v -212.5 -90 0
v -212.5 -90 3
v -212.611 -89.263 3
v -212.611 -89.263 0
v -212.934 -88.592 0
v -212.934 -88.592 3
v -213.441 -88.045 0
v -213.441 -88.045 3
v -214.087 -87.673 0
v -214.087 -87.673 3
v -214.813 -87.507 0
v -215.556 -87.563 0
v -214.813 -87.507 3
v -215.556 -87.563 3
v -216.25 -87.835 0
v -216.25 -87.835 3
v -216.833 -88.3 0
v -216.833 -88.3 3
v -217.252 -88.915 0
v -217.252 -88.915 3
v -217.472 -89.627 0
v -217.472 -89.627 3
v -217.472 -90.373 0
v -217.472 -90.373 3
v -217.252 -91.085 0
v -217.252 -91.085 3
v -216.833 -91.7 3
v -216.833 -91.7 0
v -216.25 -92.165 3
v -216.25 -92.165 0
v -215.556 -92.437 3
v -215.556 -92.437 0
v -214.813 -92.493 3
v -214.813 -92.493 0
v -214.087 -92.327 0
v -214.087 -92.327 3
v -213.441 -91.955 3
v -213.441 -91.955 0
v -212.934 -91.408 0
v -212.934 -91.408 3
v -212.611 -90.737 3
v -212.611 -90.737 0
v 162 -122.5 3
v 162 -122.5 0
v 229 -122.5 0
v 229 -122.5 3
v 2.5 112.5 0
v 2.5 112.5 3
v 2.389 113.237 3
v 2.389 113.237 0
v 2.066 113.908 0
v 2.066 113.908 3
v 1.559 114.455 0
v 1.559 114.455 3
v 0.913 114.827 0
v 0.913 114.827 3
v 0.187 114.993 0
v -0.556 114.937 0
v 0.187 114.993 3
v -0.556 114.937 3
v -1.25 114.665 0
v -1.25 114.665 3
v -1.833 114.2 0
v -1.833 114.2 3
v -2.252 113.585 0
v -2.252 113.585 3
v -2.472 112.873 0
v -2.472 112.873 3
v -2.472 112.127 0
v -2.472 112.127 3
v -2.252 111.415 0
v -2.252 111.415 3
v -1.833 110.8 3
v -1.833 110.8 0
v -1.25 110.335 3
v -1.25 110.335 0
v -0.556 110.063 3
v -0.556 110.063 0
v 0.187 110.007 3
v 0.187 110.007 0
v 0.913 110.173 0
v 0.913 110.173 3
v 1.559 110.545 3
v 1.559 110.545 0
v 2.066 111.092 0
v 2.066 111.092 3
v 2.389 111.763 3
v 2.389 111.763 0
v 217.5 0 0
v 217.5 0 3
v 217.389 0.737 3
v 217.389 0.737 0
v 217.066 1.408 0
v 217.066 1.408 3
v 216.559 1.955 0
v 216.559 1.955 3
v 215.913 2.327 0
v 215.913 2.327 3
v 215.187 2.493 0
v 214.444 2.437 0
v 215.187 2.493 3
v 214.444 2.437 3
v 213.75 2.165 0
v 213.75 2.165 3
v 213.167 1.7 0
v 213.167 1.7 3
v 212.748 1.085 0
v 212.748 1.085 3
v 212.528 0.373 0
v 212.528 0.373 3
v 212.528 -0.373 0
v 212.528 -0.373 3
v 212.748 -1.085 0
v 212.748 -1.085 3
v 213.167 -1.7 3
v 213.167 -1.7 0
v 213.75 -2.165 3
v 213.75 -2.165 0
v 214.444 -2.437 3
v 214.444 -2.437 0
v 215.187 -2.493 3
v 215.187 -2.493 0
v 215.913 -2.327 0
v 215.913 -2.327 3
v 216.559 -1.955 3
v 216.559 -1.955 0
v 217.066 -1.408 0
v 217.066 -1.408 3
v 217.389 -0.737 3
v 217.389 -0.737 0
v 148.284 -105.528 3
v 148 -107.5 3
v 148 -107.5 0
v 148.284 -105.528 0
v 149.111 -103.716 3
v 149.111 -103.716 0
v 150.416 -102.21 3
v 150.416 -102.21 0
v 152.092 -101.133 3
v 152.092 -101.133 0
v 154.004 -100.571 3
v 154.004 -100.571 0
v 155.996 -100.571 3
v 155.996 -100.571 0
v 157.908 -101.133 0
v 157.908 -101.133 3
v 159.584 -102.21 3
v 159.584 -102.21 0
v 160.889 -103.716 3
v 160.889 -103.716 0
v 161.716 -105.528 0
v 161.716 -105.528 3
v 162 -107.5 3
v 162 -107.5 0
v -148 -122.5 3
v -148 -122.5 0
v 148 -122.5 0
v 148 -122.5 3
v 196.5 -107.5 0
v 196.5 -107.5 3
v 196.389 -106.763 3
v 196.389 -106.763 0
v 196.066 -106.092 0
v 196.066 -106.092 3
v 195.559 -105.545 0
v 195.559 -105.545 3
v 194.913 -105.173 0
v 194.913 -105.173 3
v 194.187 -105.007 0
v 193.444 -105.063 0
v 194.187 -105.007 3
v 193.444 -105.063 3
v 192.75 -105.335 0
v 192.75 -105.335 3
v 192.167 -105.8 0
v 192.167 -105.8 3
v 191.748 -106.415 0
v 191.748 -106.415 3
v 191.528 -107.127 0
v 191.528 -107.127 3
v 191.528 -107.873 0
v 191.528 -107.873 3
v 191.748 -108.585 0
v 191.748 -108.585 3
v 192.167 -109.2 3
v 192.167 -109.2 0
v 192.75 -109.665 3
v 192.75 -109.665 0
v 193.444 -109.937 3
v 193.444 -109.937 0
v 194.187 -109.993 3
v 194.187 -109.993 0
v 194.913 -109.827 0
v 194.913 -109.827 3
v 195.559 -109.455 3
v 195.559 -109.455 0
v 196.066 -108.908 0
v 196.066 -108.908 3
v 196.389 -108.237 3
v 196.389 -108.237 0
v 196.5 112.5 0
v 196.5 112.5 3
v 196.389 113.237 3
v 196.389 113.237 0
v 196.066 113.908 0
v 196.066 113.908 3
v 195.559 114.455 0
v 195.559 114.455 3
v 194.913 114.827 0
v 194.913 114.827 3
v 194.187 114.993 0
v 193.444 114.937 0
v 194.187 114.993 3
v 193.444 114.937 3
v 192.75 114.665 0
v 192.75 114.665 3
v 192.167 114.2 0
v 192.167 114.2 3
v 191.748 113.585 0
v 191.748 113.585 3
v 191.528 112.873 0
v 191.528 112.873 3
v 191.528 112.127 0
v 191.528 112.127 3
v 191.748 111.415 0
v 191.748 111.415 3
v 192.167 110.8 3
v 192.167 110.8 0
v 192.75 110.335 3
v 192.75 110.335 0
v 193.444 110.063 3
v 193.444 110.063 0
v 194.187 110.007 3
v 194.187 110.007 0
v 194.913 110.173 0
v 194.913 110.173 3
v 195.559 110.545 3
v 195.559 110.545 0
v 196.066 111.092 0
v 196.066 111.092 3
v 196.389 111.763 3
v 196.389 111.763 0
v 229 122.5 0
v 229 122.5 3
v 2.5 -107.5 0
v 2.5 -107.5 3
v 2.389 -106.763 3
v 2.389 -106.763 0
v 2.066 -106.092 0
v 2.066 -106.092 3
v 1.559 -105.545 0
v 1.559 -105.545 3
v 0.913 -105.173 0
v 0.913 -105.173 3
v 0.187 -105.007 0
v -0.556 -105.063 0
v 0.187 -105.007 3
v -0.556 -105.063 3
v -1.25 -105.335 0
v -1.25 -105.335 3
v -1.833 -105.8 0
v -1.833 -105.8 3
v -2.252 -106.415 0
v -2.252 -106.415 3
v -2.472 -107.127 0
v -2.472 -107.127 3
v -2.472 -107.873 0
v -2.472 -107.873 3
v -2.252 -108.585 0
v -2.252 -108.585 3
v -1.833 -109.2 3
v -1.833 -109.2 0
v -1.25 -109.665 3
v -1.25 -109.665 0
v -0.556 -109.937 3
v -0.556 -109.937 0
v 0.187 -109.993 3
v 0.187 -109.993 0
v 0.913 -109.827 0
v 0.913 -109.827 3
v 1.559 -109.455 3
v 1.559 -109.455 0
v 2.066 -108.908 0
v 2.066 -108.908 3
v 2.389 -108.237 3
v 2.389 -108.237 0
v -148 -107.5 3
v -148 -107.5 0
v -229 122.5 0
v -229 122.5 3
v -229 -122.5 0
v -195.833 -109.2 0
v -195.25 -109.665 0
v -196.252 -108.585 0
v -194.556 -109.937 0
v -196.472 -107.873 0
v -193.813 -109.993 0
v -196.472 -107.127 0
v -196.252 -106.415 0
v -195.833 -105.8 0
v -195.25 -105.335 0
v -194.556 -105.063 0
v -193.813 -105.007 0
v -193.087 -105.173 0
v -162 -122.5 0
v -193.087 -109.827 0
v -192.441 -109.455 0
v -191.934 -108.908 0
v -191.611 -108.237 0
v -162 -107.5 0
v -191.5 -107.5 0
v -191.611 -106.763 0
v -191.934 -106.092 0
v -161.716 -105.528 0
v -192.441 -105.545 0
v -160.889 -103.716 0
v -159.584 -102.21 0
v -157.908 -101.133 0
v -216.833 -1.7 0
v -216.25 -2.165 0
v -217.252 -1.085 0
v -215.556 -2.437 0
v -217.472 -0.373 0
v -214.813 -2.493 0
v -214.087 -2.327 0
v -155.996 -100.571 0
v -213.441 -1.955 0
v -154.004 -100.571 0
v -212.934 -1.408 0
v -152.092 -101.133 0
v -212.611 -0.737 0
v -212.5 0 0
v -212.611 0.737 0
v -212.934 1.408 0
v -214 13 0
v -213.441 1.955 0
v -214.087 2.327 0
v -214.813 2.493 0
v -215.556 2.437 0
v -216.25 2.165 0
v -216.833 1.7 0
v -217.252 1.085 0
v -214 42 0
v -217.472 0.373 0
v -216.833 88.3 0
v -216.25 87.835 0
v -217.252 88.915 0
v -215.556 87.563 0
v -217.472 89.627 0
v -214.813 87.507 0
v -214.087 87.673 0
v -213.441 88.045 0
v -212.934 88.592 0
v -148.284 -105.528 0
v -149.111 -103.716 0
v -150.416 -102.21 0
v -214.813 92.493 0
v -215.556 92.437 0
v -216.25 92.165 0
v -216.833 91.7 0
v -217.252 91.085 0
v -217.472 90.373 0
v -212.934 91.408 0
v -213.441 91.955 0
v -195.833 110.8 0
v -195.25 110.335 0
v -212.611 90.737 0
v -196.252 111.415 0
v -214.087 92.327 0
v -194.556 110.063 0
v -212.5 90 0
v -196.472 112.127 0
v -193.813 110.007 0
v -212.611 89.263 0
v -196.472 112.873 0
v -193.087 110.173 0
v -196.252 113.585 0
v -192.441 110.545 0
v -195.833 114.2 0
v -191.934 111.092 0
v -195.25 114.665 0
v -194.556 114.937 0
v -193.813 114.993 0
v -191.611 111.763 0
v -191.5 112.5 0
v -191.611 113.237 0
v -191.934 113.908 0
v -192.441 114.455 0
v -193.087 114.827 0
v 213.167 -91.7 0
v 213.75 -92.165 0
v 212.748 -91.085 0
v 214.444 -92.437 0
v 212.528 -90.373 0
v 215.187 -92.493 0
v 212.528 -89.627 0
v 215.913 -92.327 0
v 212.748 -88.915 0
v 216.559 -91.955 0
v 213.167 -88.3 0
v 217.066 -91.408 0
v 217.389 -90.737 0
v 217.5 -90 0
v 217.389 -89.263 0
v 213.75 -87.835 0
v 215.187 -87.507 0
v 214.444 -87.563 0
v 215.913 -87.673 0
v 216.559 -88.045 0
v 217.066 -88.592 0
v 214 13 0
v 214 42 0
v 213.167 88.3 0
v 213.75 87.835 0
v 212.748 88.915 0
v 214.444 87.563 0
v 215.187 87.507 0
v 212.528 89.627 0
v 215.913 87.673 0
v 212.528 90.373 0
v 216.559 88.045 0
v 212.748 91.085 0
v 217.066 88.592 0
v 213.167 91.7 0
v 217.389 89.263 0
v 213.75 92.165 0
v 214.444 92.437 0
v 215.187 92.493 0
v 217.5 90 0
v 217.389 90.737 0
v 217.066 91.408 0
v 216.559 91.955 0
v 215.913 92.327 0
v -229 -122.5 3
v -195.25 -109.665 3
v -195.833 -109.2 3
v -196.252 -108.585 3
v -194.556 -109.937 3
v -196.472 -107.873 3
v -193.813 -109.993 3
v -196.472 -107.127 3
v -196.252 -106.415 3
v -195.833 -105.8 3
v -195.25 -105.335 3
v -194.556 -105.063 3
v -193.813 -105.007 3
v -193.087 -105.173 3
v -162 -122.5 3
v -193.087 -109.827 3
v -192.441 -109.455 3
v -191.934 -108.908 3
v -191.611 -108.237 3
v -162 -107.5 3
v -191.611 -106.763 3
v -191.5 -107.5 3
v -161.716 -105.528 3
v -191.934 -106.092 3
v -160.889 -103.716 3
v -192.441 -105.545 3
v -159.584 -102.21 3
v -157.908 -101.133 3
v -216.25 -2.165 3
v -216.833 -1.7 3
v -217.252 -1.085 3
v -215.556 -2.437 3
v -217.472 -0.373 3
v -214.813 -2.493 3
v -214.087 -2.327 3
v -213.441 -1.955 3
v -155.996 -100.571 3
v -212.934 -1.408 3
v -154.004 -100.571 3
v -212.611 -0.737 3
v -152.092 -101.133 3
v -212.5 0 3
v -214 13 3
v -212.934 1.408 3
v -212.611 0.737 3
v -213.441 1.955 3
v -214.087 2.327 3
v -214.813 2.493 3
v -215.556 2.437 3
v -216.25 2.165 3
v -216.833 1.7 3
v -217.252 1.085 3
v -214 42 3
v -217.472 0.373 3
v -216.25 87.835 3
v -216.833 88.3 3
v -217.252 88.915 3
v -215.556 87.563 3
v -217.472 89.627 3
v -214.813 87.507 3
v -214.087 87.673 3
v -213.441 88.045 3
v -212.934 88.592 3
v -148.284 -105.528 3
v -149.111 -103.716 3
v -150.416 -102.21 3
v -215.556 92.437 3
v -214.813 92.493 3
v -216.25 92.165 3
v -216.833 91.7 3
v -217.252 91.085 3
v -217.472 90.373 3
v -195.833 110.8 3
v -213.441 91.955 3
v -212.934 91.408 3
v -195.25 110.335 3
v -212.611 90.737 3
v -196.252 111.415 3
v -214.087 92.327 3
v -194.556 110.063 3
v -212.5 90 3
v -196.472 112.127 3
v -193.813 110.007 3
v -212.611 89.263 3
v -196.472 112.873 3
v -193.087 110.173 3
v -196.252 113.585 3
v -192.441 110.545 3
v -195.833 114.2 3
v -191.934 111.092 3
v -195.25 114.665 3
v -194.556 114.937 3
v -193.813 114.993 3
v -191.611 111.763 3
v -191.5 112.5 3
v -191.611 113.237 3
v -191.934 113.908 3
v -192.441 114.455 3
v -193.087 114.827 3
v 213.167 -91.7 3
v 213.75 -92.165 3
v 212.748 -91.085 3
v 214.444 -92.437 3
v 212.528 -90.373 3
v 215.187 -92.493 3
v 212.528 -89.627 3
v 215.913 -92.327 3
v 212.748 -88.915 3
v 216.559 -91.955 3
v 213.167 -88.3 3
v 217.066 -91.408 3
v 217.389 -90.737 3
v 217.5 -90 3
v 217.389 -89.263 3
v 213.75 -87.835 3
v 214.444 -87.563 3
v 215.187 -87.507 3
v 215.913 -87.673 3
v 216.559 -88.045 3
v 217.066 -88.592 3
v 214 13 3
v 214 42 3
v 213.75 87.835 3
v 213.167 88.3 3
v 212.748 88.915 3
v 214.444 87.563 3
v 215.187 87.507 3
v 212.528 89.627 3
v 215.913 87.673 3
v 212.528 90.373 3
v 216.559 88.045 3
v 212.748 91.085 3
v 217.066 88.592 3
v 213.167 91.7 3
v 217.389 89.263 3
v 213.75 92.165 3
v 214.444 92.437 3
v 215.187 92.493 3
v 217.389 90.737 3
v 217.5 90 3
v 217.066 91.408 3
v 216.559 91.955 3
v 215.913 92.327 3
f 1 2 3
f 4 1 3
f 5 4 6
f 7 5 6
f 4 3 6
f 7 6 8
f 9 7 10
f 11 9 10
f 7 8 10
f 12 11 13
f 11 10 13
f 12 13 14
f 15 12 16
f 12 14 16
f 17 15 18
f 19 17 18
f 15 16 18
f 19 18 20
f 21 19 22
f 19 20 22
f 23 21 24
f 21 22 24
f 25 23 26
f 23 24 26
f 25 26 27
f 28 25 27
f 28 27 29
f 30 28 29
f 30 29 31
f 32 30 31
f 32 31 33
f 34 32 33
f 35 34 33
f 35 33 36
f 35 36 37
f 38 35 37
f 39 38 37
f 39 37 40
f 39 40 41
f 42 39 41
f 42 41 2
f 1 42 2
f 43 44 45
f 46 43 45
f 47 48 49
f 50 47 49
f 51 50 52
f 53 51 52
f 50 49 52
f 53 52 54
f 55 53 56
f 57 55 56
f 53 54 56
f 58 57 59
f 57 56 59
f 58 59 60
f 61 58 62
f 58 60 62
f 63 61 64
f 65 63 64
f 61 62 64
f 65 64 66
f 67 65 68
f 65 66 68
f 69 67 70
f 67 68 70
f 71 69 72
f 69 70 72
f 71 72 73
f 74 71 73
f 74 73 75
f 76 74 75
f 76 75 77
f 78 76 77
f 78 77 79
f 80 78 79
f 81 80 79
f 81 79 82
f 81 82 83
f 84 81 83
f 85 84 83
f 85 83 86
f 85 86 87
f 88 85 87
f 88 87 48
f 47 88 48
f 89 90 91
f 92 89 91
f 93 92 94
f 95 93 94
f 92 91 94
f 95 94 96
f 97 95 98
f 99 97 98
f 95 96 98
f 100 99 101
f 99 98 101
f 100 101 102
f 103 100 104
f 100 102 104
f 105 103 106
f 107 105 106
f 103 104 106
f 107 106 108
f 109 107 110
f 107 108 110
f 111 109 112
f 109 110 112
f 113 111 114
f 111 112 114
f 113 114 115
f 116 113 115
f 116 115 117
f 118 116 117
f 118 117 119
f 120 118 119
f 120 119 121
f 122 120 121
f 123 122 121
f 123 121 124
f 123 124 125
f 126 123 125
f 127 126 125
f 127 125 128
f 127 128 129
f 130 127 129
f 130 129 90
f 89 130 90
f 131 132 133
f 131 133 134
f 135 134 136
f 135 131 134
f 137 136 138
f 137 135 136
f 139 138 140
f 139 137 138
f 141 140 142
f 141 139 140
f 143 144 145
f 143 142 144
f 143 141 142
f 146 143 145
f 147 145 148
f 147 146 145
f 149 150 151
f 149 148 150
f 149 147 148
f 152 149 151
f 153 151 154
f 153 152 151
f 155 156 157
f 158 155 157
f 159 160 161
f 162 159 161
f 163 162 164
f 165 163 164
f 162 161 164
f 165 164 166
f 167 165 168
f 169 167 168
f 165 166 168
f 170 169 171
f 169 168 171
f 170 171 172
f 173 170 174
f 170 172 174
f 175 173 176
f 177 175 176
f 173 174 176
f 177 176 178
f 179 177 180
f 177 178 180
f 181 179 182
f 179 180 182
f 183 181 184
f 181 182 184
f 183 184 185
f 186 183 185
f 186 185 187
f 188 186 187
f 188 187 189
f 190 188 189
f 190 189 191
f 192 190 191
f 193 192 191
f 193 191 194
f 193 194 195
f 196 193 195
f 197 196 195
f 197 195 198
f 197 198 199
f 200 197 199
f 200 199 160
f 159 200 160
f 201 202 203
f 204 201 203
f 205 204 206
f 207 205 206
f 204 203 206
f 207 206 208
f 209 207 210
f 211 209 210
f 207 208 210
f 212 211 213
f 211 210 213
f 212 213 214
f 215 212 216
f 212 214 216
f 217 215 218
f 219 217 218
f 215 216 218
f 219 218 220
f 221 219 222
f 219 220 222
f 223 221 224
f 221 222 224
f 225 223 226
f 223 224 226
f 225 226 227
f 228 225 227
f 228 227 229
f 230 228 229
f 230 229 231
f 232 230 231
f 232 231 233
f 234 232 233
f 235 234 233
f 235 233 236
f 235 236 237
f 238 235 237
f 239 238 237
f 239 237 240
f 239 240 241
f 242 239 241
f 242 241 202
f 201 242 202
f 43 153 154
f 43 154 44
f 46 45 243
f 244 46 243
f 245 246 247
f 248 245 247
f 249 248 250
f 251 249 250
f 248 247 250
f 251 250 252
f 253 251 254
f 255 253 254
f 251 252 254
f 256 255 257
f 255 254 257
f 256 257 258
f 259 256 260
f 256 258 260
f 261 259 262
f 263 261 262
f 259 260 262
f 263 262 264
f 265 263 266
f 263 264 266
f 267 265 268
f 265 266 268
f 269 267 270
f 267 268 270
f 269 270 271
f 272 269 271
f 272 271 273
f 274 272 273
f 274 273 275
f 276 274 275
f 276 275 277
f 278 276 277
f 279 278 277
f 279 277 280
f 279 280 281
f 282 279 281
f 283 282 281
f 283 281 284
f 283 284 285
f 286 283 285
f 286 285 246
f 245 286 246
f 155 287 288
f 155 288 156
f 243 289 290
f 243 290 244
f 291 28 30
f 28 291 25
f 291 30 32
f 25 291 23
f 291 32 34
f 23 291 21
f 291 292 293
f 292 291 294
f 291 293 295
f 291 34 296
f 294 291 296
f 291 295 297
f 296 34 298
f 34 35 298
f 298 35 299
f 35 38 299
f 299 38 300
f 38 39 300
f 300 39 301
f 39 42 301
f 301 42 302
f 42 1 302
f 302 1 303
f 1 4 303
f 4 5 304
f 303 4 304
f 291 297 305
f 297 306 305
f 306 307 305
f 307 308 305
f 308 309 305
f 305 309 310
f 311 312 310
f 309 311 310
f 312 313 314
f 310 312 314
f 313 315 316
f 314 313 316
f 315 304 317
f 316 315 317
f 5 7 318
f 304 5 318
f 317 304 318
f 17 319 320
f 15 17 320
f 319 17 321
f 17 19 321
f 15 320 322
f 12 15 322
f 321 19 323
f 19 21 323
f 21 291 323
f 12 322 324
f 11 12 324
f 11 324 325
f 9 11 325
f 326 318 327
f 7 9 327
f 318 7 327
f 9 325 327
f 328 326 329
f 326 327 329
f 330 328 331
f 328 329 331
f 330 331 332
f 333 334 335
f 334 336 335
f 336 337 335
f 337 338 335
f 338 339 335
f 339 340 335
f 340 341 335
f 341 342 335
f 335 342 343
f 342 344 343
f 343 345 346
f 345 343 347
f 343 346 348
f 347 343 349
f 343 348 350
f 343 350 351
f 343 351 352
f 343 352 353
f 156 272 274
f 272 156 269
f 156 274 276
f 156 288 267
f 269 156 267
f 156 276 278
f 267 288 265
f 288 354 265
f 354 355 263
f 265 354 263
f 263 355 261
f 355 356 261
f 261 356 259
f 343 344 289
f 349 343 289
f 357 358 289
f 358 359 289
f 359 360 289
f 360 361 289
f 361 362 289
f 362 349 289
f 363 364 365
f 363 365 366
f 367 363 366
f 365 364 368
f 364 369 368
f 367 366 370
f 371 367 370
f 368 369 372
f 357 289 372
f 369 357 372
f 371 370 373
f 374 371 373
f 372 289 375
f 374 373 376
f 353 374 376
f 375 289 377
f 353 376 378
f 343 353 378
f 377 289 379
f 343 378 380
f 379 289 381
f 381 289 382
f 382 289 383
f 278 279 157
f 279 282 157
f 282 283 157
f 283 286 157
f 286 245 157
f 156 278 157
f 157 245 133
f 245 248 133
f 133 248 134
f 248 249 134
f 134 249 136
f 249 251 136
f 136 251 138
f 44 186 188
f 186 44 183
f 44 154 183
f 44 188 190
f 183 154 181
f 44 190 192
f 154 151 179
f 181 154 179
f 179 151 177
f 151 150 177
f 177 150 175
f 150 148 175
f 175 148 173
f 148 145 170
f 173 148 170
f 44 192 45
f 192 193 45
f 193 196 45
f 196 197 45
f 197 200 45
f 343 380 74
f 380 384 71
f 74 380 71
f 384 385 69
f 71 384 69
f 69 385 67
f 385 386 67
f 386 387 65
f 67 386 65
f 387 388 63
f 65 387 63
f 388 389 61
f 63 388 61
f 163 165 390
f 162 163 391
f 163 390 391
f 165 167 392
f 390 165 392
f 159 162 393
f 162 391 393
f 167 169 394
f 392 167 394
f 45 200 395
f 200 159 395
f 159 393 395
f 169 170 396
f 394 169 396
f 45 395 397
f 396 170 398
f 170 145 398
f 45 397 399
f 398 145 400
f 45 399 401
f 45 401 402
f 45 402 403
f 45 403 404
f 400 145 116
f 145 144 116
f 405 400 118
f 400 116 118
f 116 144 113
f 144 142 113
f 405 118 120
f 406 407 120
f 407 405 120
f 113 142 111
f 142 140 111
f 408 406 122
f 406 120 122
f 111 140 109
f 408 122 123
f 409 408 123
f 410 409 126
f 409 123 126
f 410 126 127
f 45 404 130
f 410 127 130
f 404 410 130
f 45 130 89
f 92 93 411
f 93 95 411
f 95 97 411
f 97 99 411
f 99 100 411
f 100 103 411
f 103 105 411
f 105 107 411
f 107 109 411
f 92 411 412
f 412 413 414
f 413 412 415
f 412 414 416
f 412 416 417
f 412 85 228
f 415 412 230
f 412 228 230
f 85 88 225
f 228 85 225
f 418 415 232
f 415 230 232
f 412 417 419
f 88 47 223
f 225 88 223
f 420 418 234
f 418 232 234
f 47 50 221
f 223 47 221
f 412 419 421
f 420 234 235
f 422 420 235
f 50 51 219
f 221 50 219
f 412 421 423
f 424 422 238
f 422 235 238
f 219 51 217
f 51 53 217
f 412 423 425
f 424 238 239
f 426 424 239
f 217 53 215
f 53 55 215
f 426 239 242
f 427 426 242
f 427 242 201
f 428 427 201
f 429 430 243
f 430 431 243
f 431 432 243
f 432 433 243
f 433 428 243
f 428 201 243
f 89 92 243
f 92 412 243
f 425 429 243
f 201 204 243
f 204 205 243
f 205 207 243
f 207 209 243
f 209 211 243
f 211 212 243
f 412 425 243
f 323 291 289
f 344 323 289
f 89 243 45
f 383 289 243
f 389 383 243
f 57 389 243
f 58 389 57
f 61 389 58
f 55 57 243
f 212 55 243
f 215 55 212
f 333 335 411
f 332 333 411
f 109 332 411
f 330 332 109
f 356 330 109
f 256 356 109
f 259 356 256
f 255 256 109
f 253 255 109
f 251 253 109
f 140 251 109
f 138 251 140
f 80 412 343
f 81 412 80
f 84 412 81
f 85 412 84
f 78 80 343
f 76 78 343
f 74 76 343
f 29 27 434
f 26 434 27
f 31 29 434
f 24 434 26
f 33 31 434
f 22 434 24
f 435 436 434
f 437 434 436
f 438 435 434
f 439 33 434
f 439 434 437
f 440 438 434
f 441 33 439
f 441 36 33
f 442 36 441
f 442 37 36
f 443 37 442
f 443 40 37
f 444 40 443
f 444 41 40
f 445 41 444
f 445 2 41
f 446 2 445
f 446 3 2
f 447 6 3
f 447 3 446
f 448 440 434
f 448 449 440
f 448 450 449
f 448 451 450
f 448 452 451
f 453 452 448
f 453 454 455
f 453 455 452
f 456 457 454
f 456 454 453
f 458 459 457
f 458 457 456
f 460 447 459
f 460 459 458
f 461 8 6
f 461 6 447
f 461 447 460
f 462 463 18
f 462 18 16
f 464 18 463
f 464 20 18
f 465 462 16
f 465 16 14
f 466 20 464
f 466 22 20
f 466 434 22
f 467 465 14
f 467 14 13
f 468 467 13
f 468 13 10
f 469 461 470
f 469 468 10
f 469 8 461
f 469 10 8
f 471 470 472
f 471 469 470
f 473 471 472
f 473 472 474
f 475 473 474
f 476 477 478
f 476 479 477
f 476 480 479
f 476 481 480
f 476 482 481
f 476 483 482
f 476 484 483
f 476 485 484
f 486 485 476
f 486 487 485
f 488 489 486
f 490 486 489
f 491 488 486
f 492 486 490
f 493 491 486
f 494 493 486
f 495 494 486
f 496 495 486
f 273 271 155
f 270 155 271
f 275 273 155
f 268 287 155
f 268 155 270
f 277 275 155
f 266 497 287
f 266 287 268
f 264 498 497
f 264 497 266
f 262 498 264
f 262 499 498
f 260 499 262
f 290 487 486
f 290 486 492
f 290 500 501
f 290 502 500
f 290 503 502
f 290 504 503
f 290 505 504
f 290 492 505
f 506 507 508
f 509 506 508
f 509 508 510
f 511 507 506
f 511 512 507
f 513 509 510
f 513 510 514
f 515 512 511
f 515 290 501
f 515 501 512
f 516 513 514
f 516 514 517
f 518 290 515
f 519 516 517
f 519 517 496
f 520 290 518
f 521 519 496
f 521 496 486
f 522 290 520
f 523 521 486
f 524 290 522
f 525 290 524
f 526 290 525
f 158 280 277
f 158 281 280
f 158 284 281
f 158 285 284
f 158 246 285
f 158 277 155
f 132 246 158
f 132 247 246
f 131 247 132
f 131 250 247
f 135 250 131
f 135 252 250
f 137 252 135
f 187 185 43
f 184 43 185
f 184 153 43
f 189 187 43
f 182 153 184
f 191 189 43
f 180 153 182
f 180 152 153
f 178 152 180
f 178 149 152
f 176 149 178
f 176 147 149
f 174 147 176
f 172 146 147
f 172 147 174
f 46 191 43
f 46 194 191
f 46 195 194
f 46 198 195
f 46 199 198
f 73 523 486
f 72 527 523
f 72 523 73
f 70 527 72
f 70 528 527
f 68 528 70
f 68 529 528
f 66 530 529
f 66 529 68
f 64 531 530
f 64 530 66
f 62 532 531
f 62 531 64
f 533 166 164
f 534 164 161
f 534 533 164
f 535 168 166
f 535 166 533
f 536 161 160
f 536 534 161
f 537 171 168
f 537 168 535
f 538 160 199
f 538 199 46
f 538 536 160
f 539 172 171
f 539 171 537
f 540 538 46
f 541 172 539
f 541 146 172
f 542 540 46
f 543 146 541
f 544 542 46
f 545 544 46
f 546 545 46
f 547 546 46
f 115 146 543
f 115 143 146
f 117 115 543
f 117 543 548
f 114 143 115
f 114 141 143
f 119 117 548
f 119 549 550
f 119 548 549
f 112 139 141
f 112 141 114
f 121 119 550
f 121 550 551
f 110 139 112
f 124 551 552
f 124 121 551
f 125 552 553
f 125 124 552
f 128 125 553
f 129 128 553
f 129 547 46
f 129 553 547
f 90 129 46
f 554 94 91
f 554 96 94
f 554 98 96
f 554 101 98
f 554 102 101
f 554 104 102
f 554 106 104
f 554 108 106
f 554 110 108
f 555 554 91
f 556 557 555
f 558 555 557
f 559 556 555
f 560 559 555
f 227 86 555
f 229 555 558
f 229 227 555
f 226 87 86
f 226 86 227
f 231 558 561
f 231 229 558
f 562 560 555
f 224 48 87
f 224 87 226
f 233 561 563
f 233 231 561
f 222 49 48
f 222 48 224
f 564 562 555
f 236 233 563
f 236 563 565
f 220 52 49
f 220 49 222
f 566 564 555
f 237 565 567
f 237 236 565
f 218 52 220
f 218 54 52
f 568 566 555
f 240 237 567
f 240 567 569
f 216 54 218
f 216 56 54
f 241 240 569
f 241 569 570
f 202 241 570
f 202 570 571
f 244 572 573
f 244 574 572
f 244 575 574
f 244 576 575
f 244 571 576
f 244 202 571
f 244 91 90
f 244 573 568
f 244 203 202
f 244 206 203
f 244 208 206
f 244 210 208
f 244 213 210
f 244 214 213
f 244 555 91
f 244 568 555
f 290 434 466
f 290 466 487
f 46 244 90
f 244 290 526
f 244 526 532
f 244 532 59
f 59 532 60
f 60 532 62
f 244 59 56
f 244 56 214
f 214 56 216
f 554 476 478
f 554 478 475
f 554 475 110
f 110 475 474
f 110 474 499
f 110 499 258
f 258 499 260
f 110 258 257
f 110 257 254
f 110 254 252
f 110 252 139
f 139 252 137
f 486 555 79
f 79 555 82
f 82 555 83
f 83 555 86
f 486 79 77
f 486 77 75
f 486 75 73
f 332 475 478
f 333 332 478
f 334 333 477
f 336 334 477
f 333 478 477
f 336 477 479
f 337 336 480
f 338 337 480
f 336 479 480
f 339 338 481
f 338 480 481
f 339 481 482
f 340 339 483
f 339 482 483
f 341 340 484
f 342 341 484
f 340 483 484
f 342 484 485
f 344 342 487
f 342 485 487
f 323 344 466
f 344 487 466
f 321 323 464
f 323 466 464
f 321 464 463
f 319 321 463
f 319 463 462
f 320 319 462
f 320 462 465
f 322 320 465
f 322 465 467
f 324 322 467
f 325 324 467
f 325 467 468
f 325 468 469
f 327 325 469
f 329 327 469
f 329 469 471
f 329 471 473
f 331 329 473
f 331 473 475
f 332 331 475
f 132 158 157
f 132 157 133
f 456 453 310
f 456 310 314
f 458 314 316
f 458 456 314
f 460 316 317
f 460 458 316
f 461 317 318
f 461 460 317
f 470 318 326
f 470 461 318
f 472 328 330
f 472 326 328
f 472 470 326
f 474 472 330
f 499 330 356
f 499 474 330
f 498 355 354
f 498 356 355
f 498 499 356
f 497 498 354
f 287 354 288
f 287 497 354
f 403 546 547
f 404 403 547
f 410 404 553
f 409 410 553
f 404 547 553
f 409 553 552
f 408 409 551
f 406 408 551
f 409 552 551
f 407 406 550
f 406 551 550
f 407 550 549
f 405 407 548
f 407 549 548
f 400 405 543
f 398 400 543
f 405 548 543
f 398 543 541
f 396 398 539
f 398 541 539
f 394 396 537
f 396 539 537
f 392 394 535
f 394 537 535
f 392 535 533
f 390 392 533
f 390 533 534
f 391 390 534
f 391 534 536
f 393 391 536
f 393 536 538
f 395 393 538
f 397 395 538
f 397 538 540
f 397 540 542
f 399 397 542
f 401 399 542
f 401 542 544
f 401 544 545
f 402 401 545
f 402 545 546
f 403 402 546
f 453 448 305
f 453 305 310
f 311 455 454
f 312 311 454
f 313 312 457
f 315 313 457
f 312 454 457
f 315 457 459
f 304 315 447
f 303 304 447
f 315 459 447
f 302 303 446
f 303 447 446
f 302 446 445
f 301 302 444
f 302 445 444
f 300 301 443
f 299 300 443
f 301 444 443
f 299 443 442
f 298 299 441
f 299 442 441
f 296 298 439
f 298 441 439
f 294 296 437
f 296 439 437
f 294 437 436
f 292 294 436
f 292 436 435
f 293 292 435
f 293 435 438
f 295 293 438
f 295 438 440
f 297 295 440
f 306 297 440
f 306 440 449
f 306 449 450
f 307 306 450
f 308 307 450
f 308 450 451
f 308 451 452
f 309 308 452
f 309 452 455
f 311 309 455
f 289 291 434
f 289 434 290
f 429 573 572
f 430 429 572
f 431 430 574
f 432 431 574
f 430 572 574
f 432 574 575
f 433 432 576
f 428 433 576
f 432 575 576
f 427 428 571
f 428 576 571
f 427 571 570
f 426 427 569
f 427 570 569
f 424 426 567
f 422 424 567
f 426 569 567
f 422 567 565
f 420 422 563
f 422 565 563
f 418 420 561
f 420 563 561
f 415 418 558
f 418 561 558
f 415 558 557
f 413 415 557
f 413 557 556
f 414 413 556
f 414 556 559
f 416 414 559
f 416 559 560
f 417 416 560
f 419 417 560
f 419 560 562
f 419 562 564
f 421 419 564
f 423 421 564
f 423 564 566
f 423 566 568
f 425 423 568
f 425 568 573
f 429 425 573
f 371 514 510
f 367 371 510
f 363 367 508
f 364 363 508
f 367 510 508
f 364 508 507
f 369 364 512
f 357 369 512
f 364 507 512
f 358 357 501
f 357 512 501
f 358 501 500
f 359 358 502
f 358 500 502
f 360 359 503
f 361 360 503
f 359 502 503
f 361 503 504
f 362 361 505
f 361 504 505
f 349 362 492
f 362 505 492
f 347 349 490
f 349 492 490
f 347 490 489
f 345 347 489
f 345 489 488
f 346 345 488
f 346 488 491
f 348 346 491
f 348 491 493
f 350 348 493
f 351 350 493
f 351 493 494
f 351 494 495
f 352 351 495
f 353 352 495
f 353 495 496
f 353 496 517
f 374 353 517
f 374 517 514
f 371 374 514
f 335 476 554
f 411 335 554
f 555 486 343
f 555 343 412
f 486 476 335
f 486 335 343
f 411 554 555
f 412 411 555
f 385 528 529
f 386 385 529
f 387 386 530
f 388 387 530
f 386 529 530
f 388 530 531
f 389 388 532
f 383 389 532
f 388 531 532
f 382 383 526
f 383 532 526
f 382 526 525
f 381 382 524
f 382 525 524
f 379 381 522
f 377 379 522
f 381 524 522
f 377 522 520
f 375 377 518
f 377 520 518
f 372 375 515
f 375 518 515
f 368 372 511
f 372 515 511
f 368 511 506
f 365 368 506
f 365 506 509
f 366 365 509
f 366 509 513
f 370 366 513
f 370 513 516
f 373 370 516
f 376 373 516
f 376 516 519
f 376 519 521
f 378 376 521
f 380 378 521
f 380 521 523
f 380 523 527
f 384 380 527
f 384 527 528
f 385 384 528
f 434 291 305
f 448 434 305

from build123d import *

# Parameters (mm, degrees)
SKETCH1_W           = 458
SKETCH1_H           = 245
BOSS_EXTRUDE1_DEPTH = 3
CUT_EXTRUDE1_DEPTH  = 260.723410574
SKETCH3_R           = 2.5
CUT_EXTRUDE2_DEPTH  = 260.723410574
SKETCH4_W           = 428
SKETCH4_H           = 29
CUT_EXTRUDE3_DEPTH  = 260.723410574


with BuildPart() as part:
    # Sketch1 → Boss-Extrude1 (new body)
    with BuildSketch(Plane.XY):
        Rectangle(SKETCH1_W, SKETCH1_H)
    extrude(amount=BOSS_EXTRUDE1_DEPTH)

    # Sketch2 → Cut-Extrude1 (cut, through all)
    with BuildSketch(Plane.XY.offset(3)):
        with BuildLine():
            Line((-148, -107.5), (-148, -122.5))
            ThreePointArc((-148, -122.5), (-155, -129.5), (-162, -122.5))
            Line((-162, -122.5), (-162, -107.5))
            ThreePointArc((-162, -107.5), (-155, -100.5), (-148, -107.5))
        make_face()
        with BuildLine():
            Line((162, -107.5), (162, -122.5))
            ThreePointArc((162, -122.5), (155, -129.5), (148, -122.5))
            Line((148, -122.5), (148, -107.5))
            ThreePointArc((148, -107.5), (155, -100.5), (162, -107.5))
        make_face()
    extrude(amount=-CUT_EXTRUDE1_DEPTH, mode=Mode.SUBTRACT)

    # Sketch3 → Cut-Extrude2 (cut, through all)
    with BuildSketch(Plane.XY.offset(3)):
        with Locations((-194, 112.5)):
            Circle(SKETCH3_R)
        with Locations((-194, -107.5)):
            Circle(SKETCH3_R)
        with Locations((194, -107.5)):
            Circle(SKETCH3_R)
        with Locations((194, 112.5)):
            Circle(SKETCH3_R)
        with Locations((-215, 0)):
            Circle(SKETCH3_R)
        with Locations((-215, -90)):
            Circle(SKETCH3_R)
        with Locations((-215, 90)):
            Circle(SKETCH3_R)
        with Locations((215, 0)):
            Circle(SKETCH3_R)
        with Locations((215, -90)):
            Circle(SKETCH3_R)
        with Locations((215, 90)):
            Circle(SKETCH3_R)
        with Locations((0, 112.5)):
            Circle(SKETCH3_R)
        with Locations((0, -107.5)):
            Circle(SKETCH3_R)
    extrude(amount=-CUT_EXTRUDE2_DEPTH, mode=Mode.SUBTRACT)

    # Sketch4 → Cut-Extrude3 (cut, through all)
    with BuildSketch(Plane.XY.offset(3)):
        with Locations((0, 27.5)):
            Rectangle(SKETCH4_W, SKETCH4_H)
    extrude(amount=-CUT_EXTRUDE3_DEPTH, mode=Mode.SUBTRACT)


solid = part.part
